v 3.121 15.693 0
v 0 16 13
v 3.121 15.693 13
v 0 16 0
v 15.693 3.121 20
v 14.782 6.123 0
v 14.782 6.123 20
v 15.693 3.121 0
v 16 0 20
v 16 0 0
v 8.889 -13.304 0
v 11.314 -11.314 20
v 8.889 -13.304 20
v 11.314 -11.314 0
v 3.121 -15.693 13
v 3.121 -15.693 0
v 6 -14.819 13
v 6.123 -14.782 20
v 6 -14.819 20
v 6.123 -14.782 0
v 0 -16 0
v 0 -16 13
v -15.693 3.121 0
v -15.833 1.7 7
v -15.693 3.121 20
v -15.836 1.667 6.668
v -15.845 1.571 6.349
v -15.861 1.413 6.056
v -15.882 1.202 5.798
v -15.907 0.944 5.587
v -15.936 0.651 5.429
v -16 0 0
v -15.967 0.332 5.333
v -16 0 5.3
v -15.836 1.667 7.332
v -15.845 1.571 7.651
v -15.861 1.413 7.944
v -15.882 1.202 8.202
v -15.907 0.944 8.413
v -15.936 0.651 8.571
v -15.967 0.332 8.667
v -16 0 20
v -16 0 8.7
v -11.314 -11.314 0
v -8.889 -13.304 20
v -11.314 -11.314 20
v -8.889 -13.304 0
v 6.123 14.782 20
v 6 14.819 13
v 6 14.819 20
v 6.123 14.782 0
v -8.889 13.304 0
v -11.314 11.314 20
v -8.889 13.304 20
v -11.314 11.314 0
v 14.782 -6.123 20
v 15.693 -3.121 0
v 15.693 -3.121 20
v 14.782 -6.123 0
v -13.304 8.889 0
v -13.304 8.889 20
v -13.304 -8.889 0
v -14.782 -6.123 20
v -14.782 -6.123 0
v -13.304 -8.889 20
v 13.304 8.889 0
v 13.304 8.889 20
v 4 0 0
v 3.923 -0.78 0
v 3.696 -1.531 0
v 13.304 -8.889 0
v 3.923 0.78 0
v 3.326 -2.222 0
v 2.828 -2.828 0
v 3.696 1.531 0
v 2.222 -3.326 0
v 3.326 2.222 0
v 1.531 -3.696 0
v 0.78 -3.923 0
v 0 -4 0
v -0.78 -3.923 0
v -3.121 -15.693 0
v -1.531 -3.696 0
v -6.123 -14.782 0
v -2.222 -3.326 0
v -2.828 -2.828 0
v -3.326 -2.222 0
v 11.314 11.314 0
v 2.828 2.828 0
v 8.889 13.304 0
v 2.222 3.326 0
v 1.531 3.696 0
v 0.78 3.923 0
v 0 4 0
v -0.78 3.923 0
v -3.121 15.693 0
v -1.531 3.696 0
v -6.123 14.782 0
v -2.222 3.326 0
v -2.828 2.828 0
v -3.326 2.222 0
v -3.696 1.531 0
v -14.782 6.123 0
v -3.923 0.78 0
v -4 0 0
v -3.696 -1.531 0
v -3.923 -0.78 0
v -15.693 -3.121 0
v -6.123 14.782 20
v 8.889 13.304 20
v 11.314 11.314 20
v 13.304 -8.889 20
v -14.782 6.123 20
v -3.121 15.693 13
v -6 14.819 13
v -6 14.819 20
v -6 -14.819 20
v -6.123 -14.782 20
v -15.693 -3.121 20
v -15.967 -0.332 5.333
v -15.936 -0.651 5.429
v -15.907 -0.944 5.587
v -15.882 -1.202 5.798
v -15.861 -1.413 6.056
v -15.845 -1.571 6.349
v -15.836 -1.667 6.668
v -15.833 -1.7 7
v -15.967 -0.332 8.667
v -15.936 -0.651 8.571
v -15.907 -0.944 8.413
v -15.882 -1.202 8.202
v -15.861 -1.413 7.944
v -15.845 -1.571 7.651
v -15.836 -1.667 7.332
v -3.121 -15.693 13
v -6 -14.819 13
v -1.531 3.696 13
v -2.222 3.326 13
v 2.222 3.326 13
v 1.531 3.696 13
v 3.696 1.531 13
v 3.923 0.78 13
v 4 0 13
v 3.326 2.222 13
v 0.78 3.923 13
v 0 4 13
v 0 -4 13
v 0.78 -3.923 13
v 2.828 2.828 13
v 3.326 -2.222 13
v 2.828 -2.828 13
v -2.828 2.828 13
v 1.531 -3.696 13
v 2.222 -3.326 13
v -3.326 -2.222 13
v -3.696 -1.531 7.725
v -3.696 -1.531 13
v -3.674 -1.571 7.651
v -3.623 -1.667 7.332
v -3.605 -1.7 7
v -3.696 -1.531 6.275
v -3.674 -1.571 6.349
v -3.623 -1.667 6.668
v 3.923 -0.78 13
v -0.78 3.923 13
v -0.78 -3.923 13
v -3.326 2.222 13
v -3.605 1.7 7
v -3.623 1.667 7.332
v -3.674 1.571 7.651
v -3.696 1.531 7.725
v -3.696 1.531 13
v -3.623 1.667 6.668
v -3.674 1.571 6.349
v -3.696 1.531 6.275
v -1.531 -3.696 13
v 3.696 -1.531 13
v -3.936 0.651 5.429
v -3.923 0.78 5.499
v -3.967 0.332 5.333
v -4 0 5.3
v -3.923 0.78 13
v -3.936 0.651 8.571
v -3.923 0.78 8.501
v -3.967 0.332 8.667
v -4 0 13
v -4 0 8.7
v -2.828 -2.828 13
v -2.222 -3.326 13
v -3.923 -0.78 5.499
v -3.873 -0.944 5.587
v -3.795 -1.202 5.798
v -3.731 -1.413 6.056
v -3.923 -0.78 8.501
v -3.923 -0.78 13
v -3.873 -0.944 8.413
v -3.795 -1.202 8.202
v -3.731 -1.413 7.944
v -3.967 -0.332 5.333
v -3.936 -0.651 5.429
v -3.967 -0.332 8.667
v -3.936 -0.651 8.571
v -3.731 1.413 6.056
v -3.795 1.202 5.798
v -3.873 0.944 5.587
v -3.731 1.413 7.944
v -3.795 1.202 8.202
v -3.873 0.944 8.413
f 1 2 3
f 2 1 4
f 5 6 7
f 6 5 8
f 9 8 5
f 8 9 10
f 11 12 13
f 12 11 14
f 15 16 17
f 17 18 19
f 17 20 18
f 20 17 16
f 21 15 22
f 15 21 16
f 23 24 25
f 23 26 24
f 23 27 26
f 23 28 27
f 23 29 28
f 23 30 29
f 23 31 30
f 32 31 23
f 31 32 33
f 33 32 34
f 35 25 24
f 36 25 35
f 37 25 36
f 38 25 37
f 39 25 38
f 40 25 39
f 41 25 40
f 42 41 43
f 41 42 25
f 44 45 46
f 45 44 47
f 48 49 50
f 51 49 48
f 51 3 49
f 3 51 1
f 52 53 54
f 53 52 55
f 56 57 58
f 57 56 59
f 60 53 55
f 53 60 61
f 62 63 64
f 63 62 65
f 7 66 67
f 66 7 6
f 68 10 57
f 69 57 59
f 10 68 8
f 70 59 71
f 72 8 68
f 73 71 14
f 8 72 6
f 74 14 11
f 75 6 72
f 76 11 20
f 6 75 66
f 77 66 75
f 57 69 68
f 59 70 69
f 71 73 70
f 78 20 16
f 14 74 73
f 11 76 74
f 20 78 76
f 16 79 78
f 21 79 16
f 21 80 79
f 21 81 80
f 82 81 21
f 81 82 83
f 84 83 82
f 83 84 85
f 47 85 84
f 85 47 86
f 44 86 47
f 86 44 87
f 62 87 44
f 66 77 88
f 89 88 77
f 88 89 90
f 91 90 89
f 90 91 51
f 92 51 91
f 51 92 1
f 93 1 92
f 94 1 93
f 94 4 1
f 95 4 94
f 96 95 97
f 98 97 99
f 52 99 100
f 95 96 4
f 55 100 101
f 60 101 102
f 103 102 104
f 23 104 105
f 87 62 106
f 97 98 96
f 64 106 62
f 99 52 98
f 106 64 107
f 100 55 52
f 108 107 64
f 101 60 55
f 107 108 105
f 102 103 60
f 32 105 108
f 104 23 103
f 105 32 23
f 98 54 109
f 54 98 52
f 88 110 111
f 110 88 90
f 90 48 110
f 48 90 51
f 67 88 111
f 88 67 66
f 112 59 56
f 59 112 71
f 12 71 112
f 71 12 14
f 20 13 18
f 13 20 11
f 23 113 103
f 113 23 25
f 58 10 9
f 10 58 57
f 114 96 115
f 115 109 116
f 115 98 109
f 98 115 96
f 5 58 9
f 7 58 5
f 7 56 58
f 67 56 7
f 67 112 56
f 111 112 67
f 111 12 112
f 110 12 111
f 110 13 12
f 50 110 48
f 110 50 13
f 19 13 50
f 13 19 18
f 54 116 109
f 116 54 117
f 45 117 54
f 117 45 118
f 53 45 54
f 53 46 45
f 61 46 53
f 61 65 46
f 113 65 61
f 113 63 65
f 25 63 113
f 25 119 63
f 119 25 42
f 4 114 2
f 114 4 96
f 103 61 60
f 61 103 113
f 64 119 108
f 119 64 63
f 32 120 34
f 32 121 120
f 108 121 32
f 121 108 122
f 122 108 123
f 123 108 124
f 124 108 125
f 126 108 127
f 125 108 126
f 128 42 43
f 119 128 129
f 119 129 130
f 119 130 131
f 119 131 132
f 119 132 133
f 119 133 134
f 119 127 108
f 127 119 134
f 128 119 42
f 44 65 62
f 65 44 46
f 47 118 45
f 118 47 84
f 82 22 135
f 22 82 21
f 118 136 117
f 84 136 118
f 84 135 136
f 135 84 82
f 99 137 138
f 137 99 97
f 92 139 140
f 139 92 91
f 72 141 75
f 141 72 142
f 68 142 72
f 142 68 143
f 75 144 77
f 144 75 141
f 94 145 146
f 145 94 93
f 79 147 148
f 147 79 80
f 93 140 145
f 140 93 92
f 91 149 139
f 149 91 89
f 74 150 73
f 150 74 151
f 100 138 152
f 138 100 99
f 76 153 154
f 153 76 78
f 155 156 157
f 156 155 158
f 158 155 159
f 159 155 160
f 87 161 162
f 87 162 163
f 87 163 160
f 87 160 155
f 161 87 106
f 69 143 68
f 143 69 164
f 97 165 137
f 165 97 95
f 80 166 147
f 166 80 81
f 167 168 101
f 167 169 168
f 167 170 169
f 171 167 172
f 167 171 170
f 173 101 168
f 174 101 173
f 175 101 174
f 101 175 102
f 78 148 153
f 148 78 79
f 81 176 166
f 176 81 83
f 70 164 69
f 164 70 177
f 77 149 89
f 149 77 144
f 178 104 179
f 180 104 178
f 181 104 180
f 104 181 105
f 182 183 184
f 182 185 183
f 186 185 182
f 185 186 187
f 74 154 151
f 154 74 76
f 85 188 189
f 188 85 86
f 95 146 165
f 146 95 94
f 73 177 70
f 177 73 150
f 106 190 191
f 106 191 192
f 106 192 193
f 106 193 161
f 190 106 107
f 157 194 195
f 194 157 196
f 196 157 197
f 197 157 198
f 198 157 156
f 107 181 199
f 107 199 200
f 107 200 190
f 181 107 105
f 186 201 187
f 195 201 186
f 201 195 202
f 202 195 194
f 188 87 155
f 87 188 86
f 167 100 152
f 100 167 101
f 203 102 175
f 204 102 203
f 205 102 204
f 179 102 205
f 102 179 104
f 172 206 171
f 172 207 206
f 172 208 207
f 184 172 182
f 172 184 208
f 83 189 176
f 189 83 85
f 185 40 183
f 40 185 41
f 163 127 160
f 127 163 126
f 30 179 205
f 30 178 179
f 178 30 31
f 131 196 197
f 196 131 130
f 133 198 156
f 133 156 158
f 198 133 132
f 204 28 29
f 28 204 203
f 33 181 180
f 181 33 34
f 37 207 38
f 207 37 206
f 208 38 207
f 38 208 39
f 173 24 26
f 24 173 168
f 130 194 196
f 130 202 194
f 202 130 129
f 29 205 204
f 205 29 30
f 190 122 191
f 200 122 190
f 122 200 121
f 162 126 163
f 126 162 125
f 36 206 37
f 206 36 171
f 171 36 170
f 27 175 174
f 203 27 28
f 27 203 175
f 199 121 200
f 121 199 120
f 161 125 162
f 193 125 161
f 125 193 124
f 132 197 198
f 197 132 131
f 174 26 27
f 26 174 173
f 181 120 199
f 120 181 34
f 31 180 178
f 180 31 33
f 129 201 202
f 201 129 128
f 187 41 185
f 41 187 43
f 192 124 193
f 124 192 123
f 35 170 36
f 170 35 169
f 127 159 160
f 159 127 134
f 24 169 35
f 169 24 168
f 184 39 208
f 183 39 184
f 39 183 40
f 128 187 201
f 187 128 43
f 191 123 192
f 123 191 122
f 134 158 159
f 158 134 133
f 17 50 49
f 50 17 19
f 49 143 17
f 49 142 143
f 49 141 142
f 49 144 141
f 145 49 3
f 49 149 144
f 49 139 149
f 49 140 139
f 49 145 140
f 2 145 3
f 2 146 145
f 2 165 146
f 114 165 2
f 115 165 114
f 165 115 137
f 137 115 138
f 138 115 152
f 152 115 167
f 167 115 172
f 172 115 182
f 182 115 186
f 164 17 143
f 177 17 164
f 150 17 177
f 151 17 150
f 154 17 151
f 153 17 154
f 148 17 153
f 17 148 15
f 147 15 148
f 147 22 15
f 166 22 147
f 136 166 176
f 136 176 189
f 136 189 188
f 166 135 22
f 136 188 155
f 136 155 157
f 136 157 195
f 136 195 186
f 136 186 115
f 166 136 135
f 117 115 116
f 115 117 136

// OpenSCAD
$fn = 32;

// ----------------------------------------------------------------------
// Oldham coupling hub: 32 x 20 mm
// ----------------------------------------------------------------------

// --- parameters (mm) ---
flange_dia = 32;          // hub diameter
flange_len = 14;          // hub length
hub_bore = 8;             // shaft bore
key_w = 12;               // drive tongue width
tongue_h = 6;             // drive tongue height
set_d = 3.4;              // set screw tap hole

module hub() {
  /* the slot side is a raised disc with a groove milled across it */
  cylinder(h = flange_len + tongue_h, d = flange_dia);
}

difference() {
  hub();
  translate([0, 0, -1]) cylinder(h = flange_len + tongue_h + 2, d = hub_bore);
  translate([-flange_dia / 2 - 1, 0, flange_len * 0.5])
    rotate([0, 90, 0]) cylinder(h = flange_dia / 2 + 2, d = set_d);
  translate([-key_w / 2, -flange_dia / 2 - 1, flange_len - 1])
    cube([key_w, flange_dia + 2, tongue_h + 1]);
}
